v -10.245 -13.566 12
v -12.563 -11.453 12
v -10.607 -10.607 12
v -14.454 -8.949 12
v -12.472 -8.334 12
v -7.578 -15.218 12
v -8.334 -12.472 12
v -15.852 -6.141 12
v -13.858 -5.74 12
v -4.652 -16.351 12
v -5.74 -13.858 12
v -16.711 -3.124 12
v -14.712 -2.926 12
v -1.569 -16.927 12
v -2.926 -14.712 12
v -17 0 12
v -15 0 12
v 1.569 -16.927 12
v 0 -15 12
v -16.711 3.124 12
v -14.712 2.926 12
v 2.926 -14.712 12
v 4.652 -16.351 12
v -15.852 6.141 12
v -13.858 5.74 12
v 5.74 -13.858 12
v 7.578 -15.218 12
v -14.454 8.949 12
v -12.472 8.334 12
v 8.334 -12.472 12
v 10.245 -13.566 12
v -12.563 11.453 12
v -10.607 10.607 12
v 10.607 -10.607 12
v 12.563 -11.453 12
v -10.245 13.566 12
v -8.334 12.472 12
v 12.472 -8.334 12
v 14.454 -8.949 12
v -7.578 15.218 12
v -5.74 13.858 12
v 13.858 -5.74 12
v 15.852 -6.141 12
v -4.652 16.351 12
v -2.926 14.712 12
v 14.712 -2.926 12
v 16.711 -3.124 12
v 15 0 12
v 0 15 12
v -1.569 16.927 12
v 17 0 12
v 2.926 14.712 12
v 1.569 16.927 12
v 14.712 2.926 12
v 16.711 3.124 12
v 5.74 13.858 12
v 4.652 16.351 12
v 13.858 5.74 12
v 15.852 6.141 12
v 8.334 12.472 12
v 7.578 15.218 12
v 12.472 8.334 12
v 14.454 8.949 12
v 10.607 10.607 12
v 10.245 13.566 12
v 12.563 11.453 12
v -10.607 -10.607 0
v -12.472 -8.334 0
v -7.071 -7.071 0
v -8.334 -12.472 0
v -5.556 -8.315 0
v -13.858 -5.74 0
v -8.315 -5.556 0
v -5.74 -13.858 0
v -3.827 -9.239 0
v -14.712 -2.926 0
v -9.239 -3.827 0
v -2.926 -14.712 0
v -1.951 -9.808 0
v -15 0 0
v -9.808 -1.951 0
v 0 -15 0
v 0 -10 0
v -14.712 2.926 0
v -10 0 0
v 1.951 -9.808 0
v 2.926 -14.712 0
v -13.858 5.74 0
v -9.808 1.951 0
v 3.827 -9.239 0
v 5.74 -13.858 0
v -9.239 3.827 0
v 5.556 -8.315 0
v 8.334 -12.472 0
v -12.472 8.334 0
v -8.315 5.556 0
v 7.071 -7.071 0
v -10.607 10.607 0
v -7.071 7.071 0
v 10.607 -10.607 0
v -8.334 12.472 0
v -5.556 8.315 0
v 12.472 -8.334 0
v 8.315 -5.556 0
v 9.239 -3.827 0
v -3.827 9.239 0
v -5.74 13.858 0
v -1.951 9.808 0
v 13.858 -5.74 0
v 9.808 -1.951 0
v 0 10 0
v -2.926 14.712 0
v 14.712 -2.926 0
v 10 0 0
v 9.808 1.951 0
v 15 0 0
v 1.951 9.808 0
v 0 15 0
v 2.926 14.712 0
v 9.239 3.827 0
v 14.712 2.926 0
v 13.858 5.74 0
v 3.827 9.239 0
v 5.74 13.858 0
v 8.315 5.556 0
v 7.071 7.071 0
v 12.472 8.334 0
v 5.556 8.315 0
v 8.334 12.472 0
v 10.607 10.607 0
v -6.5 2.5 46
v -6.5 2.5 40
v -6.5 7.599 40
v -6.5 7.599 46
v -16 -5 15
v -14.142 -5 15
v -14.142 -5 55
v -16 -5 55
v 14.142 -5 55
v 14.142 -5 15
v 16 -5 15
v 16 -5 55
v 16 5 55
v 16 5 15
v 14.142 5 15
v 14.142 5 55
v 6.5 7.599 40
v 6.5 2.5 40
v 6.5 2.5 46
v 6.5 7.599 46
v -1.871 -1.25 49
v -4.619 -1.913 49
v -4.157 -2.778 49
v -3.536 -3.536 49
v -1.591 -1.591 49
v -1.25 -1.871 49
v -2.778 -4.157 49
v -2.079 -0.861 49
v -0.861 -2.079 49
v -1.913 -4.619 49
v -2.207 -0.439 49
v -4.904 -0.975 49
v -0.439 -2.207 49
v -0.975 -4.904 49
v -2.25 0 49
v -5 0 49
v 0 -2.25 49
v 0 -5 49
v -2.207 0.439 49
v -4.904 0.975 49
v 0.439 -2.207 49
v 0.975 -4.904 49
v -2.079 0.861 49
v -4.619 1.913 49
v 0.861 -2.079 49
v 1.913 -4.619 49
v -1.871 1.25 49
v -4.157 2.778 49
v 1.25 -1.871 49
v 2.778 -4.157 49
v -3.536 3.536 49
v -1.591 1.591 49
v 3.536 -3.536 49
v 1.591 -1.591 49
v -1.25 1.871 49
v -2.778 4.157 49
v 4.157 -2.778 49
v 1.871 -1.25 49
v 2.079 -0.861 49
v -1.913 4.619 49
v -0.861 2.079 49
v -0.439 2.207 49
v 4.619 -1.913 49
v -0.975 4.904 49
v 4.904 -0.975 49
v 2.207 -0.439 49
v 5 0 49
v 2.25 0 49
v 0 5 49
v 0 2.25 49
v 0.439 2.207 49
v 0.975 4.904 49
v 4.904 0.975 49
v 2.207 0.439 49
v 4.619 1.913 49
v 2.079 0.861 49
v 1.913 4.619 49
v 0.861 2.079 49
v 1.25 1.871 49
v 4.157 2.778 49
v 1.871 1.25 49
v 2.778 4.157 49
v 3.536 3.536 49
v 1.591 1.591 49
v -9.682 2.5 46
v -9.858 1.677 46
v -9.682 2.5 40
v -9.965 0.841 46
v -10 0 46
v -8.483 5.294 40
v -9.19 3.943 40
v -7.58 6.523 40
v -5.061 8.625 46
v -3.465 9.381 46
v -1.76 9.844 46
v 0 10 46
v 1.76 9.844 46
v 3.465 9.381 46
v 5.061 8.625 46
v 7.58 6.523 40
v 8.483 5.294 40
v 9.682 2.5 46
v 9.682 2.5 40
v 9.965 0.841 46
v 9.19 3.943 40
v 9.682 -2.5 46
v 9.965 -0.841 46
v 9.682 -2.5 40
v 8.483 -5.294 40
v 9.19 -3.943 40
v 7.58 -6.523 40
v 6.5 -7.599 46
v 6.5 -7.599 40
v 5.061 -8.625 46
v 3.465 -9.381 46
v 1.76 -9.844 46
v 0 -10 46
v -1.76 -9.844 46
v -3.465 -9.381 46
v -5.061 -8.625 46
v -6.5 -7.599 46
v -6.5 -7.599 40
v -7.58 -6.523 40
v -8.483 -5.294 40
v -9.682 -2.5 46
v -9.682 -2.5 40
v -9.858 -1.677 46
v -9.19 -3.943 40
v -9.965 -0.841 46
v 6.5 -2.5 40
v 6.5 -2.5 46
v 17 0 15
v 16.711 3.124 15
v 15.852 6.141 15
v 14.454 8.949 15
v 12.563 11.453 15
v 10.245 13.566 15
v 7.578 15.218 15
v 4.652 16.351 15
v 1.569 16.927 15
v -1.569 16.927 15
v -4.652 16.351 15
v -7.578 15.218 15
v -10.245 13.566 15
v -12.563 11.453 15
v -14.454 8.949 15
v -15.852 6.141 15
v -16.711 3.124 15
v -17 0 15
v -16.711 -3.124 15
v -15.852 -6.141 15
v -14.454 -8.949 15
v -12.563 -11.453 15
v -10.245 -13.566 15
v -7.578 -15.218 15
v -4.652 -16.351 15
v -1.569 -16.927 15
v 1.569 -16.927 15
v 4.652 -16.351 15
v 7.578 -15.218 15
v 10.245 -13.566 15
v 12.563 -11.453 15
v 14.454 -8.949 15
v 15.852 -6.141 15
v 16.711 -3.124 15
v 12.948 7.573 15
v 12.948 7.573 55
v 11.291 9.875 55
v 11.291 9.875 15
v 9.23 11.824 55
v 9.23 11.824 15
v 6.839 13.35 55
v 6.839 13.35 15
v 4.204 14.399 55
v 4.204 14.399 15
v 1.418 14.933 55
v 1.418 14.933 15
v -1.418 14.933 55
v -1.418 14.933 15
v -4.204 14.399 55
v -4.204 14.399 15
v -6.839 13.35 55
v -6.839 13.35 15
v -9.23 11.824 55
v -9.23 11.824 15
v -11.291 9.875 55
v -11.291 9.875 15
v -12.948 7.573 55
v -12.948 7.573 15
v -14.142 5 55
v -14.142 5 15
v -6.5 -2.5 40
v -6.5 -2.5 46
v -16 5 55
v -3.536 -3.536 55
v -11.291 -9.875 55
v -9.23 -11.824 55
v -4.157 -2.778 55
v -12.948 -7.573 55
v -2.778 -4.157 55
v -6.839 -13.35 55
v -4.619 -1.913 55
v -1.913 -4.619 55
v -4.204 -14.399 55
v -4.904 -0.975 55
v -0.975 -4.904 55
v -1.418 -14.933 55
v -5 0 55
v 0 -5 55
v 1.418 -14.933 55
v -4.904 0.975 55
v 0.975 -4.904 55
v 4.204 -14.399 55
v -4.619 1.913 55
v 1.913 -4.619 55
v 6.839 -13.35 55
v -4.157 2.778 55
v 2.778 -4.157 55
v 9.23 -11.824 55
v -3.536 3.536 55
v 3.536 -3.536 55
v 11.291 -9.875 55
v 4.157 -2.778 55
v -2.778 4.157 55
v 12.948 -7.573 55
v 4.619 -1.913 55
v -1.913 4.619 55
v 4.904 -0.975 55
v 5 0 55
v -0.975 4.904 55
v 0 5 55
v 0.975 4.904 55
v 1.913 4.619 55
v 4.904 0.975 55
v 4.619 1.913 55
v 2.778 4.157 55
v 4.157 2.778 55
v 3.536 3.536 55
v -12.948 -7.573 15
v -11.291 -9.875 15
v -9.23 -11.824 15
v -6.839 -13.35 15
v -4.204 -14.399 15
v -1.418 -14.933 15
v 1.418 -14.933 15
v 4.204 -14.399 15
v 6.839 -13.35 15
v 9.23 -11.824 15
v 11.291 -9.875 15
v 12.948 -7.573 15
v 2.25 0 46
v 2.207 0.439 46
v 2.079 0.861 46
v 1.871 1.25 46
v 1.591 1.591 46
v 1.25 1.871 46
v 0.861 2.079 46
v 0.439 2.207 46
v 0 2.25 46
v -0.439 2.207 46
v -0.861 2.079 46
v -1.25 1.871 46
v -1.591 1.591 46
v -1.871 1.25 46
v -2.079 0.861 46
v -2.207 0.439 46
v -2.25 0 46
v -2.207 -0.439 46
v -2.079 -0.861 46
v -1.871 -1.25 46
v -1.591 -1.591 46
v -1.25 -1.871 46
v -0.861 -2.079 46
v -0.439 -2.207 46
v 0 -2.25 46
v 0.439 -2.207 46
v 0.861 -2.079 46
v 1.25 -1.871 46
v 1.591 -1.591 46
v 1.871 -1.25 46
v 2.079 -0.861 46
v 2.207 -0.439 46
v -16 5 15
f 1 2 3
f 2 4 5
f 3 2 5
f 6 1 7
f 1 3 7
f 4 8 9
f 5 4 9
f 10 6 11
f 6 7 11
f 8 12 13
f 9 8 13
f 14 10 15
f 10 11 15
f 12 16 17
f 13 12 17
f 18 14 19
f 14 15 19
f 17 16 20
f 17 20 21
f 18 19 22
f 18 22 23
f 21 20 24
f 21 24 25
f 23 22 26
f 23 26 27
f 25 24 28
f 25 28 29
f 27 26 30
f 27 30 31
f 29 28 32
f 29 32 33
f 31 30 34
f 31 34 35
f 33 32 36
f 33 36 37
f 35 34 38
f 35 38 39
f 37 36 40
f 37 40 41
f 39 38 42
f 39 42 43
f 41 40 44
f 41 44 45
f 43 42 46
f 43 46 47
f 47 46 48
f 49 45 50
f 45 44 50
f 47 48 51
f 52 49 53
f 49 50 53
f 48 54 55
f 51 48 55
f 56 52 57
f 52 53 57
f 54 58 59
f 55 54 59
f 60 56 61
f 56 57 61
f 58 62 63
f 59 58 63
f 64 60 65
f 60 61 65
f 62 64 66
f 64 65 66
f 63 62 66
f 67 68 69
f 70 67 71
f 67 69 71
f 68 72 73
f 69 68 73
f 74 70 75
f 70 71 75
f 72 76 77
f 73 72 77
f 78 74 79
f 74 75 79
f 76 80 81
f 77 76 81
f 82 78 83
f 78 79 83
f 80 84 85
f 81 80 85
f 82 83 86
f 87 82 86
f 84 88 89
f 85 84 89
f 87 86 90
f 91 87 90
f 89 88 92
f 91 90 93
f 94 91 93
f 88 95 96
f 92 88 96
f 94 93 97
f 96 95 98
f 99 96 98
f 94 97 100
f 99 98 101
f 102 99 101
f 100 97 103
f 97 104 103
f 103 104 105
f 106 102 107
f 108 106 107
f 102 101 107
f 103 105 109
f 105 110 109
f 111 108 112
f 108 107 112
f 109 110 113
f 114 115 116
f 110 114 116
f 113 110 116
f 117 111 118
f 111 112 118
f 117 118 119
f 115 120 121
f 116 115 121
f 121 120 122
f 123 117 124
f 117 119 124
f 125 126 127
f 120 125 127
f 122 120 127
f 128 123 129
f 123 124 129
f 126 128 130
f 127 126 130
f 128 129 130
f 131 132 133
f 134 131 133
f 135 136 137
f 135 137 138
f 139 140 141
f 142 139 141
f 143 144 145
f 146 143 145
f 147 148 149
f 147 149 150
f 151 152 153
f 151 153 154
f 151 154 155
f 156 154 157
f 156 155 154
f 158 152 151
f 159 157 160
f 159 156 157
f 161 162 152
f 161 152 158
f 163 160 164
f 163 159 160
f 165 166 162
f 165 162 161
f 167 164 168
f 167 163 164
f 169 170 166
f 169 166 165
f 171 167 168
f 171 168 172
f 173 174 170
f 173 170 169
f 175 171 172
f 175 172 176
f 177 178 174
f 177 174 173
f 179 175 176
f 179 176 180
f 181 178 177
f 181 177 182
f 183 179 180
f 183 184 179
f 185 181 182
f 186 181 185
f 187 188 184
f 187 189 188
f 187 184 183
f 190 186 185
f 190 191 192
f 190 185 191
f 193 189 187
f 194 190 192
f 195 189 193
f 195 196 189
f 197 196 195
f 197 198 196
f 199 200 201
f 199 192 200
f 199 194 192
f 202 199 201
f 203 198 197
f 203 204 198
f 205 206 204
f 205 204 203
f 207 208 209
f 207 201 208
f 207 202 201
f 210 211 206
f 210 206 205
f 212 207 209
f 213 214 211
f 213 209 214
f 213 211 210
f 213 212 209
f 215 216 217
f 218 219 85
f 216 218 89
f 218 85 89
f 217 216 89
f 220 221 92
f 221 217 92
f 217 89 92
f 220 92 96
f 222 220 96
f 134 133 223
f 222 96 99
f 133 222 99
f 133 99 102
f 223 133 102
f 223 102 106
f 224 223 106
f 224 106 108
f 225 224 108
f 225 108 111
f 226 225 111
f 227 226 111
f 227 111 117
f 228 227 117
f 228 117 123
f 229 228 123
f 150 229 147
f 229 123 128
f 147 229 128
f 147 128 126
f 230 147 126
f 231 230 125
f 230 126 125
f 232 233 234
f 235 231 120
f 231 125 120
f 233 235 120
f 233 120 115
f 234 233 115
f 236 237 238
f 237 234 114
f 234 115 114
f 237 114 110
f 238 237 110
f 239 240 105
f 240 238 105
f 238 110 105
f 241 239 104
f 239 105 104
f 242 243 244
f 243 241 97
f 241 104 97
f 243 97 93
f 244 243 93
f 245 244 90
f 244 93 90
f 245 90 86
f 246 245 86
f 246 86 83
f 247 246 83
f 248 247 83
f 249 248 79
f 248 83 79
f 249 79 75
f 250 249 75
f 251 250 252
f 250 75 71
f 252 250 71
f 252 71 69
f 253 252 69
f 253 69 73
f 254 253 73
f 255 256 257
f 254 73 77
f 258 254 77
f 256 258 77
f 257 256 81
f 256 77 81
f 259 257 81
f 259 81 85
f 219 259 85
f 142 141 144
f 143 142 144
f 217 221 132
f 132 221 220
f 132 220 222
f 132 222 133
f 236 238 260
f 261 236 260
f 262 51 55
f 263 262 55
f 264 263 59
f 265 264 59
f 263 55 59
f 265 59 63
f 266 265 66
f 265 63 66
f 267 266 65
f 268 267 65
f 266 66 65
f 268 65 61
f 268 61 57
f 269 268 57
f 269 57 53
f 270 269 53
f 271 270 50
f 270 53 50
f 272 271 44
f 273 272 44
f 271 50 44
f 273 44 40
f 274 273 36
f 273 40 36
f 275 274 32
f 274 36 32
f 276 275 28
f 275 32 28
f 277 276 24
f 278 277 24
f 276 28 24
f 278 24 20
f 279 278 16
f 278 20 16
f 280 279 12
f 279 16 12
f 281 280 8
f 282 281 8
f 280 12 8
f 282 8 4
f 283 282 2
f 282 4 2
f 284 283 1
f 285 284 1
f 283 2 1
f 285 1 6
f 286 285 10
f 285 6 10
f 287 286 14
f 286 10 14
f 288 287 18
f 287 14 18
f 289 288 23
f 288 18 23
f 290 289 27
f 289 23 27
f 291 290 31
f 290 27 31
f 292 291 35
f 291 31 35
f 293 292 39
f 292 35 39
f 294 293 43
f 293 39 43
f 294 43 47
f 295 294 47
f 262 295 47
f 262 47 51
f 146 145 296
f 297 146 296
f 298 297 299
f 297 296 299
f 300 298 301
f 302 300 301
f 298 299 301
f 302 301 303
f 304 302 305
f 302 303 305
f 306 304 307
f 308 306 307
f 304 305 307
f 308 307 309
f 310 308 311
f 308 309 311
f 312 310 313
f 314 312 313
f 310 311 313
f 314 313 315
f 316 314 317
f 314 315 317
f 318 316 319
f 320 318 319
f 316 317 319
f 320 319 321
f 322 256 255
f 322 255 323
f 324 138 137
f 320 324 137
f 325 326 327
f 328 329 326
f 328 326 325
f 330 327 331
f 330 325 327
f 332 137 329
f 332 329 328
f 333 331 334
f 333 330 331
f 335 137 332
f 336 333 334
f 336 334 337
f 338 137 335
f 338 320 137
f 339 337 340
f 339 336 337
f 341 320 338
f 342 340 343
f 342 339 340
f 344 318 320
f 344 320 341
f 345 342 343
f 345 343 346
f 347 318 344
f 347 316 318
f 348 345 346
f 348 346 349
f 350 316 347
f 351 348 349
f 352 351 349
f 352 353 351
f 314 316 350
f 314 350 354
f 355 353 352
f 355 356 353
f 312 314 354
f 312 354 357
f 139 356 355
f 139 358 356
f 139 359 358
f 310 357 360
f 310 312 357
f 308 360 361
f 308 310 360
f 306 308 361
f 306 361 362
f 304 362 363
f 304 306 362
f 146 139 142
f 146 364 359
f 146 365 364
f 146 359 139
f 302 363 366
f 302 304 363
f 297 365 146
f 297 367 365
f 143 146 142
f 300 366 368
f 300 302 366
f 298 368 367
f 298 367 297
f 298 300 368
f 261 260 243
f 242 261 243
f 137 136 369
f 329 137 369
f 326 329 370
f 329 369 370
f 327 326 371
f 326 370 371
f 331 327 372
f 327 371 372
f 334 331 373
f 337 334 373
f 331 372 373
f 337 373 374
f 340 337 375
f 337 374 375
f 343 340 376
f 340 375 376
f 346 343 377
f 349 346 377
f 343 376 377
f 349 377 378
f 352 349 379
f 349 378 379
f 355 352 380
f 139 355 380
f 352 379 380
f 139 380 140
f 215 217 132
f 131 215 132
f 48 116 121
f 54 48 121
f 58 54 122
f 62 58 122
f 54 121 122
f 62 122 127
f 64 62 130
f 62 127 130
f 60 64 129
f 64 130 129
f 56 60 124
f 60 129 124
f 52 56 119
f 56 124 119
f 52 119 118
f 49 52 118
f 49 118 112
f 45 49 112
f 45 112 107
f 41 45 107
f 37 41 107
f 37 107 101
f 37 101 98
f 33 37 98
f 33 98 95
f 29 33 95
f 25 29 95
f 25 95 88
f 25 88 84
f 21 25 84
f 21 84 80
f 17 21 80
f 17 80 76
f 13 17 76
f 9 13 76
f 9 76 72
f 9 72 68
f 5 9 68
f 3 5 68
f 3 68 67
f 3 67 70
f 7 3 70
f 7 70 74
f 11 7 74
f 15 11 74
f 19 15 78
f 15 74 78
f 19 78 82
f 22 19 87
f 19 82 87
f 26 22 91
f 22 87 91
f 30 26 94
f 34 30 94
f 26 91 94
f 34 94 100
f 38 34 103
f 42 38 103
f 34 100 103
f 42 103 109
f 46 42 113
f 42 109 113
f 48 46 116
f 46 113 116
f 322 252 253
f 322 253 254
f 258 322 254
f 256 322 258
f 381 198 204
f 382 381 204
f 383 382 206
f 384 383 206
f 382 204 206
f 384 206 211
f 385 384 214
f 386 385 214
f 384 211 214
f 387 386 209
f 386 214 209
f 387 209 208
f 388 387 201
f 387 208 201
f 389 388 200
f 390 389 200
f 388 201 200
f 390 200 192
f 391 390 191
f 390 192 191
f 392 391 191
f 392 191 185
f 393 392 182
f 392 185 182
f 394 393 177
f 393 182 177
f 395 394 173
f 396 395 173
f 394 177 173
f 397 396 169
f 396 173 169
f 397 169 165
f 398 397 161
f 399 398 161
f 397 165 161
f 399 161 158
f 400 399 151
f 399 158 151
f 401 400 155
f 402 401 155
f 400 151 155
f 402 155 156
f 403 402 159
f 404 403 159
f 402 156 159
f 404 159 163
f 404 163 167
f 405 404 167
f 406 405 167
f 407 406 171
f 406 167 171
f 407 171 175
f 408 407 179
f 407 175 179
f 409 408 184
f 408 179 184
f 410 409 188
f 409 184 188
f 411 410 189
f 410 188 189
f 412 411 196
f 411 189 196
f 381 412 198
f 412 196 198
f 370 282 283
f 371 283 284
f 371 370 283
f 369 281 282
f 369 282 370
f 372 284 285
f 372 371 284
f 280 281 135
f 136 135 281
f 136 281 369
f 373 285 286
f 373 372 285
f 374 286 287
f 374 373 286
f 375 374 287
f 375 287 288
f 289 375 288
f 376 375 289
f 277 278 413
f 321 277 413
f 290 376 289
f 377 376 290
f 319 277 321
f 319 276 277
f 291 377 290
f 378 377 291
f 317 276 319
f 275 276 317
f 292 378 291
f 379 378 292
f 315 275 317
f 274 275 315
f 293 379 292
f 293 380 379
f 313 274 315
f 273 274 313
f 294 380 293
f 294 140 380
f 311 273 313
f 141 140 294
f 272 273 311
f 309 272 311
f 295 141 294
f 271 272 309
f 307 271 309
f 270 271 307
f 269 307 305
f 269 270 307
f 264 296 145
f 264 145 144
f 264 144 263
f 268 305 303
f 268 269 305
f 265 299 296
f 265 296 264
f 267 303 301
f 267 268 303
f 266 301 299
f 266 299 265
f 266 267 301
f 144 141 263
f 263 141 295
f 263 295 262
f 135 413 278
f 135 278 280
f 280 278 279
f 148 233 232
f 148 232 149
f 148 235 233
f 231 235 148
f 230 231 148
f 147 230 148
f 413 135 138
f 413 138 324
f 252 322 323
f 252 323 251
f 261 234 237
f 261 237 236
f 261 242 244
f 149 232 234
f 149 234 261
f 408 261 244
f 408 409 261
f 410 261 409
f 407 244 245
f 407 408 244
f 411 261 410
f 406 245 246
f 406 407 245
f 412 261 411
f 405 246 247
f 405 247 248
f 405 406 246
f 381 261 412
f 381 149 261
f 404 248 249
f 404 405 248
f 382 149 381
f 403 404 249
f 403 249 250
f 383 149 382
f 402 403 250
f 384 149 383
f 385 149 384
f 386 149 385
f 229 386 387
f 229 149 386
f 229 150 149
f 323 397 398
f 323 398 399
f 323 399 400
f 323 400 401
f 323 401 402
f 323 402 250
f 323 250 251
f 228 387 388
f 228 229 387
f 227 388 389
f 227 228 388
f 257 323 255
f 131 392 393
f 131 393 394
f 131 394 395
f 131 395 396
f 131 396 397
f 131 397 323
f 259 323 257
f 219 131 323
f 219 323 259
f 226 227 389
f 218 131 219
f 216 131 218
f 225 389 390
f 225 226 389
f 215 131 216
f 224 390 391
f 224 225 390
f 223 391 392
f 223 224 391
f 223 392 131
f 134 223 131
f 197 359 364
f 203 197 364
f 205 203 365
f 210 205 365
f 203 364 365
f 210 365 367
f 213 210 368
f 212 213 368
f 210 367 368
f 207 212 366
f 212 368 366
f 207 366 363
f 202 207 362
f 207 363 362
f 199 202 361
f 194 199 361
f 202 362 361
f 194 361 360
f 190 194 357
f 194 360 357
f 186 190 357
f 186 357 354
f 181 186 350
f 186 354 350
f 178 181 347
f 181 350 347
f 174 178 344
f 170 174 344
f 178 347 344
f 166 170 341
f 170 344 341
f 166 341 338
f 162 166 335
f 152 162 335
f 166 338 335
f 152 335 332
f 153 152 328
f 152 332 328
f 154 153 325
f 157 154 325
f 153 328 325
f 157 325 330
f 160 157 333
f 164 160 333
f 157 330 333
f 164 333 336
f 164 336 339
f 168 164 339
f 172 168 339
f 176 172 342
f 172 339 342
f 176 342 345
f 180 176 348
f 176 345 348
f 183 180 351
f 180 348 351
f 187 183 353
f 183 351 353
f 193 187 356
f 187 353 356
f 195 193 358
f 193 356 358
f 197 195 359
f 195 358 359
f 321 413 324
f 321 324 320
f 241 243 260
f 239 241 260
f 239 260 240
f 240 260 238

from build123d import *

# Parameters (mm, degrees)
SKETCH1_R           = 15
BOSS_EXTRUDE1_DEPTH = 55
SKETCH2_R           = 10
CUT_EXTRUDE7_DEPTH  = 46
SKETCH7_R           = 5
CUT_EXTRUDE8_DEPTH  = 6
SKETCH8_R           = 2.25
CUT_EXTRUDE9_DEPTH  = 3
BOSS_EXTRUDE5_START = 6
BOSS_EXTRUDE5_DEPTH = 6
BOSS_EXTRUDE6_START = -3
SKETCH11_R          = 17
SKETCH11_R_2        = 15
BOSS_EXTRUDE6_DEPTH = 3
BOSS_EXTRUDE8_START = -40
BOSS_EXTRUDE8_DEPTH = 40


with BuildPart() as part:
    # Sketch1 → Boss-Extrude1 (new body)
    with BuildSketch(Plane.XY):
        Circle(SKETCH1_R)
    extrude(amount=BOSS_EXTRUDE1_DEPTH)

    # Sketch2 → Cut-Extrude7 (cut)
    with BuildSketch(Plane(origin=(0, 0, 0), x_dir=(-1, 0, 0), z_dir=(0, 0, -1))):
        Circle(SKETCH2_R)
    extrude(amount=-CUT_EXTRUDE7_DEPTH, mode=Mode.SUBTRACT)

    # Sketch7 → Cut-Extrude8 (cut)
    with BuildSketch(Plane.XY.offset(55)):
        Circle(SKETCH7_R)
    extrude(amount=-CUT_EXTRUDE8_DEPTH, mode=Mode.SUBTRACT)

    # Sketch8 → Cut-Extrude9 (cut)
    with BuildSketch(Plane.XY.offset(49)):
        Circle(SKETCH8_R)
    extrude(amount=-CUT_EXTRUDE9_DEPTH, mode=Mode.SUBTRACT)

    # Sketch9 → Boss-Extrude5 (add)
    with BuildSketch(Plane(origin=(0, 0, 46), x_dir=(-1, 0, 0), z_dir=(0, 0, -1)).offset(BOSS_EXTRUDE5_START)):
        with BuildLine():
            Line((-9.682458366, -2.5), (-6.5, -2.5))
            Line((-6.5, -2.5), (-6.5, -7.599342077))
            ThreePointArc((-6.5, -7.599342077), (-8.48344341, -5.294448782), (-9.682458366, -2.5))
        make_face()
        with BuildLine():
            Line((-9.682458366, 2.5), (-6.5, 2.5))
            Line((-6.5, 2.5), (-6.5, 7.599342077))
            ThreePointArc((-6.5, 7.599342077), (-8.48344341, 5.294448782), (-9.682458366, 2.5))
        make_face()
        with BuildLine():
            Line((9.682458366, -2.5), (6.5, -2.5))
            Line((6.5, -2.5), (6.5, -7.599342077))
            ThreePointArc((6.5, -7.599342077), (8.48344341, -5.294448782), (9.682458366, -2.5))
        make_face()
        with BuildLine():
            Line((6.5, 2.5), (6.5, 7.599342077))
            ThreePointArc((6.5, 7.599342077), (8.48344341, 5.294448782), (9.682458366, 2.5))
            Line((9.682458366, 2.5), (6.5, 2.5))
        make_face()
    extrude(amount=-BOSS_EXTRUDE5_DEPTH)

    # Sketch11 → Boss-Extrude6 (add)
    with BuildSketch(Plane.XY.offset(15).offset(BOSS_EXTRUDE6_START)):
        Circle(SKETCH11_R)
        Circle(SKETCH11_R_2, mode=Mode.SUBTRACT)
    extrude(amount=BOSS_EXTRUDE6_DEPTH)

    # Sketch10 → Boss-Extrude8 (add)
    with BuildSketch(Plane.XY.offset(55).offset(BOSS_EXTRUDE8_START)):
        with BuildLine():
            Line((16, 5), (14.142135624, 5))
            ThreePointArc((14.142135624, 5), (15, 0), (14.142135624, -5))
            Line((14.142135624, -5), (16, -5))
            Line((16, -5), (16, 5))
        make_face()
        with BuildLine():
            ThreePointArc((-14.142135624, 5), (-15, 0), (-14.142135624, -5))
            Line((-14.142135624, -5), (-16, -5))
            Line((-16, -5), (-16, 5))
            Line((-16, 5), (-14.142135624, 5))
        make_face()
    extrude(amount=BOSS_EXTRUDE8_DEPTH)


solid = part.part
